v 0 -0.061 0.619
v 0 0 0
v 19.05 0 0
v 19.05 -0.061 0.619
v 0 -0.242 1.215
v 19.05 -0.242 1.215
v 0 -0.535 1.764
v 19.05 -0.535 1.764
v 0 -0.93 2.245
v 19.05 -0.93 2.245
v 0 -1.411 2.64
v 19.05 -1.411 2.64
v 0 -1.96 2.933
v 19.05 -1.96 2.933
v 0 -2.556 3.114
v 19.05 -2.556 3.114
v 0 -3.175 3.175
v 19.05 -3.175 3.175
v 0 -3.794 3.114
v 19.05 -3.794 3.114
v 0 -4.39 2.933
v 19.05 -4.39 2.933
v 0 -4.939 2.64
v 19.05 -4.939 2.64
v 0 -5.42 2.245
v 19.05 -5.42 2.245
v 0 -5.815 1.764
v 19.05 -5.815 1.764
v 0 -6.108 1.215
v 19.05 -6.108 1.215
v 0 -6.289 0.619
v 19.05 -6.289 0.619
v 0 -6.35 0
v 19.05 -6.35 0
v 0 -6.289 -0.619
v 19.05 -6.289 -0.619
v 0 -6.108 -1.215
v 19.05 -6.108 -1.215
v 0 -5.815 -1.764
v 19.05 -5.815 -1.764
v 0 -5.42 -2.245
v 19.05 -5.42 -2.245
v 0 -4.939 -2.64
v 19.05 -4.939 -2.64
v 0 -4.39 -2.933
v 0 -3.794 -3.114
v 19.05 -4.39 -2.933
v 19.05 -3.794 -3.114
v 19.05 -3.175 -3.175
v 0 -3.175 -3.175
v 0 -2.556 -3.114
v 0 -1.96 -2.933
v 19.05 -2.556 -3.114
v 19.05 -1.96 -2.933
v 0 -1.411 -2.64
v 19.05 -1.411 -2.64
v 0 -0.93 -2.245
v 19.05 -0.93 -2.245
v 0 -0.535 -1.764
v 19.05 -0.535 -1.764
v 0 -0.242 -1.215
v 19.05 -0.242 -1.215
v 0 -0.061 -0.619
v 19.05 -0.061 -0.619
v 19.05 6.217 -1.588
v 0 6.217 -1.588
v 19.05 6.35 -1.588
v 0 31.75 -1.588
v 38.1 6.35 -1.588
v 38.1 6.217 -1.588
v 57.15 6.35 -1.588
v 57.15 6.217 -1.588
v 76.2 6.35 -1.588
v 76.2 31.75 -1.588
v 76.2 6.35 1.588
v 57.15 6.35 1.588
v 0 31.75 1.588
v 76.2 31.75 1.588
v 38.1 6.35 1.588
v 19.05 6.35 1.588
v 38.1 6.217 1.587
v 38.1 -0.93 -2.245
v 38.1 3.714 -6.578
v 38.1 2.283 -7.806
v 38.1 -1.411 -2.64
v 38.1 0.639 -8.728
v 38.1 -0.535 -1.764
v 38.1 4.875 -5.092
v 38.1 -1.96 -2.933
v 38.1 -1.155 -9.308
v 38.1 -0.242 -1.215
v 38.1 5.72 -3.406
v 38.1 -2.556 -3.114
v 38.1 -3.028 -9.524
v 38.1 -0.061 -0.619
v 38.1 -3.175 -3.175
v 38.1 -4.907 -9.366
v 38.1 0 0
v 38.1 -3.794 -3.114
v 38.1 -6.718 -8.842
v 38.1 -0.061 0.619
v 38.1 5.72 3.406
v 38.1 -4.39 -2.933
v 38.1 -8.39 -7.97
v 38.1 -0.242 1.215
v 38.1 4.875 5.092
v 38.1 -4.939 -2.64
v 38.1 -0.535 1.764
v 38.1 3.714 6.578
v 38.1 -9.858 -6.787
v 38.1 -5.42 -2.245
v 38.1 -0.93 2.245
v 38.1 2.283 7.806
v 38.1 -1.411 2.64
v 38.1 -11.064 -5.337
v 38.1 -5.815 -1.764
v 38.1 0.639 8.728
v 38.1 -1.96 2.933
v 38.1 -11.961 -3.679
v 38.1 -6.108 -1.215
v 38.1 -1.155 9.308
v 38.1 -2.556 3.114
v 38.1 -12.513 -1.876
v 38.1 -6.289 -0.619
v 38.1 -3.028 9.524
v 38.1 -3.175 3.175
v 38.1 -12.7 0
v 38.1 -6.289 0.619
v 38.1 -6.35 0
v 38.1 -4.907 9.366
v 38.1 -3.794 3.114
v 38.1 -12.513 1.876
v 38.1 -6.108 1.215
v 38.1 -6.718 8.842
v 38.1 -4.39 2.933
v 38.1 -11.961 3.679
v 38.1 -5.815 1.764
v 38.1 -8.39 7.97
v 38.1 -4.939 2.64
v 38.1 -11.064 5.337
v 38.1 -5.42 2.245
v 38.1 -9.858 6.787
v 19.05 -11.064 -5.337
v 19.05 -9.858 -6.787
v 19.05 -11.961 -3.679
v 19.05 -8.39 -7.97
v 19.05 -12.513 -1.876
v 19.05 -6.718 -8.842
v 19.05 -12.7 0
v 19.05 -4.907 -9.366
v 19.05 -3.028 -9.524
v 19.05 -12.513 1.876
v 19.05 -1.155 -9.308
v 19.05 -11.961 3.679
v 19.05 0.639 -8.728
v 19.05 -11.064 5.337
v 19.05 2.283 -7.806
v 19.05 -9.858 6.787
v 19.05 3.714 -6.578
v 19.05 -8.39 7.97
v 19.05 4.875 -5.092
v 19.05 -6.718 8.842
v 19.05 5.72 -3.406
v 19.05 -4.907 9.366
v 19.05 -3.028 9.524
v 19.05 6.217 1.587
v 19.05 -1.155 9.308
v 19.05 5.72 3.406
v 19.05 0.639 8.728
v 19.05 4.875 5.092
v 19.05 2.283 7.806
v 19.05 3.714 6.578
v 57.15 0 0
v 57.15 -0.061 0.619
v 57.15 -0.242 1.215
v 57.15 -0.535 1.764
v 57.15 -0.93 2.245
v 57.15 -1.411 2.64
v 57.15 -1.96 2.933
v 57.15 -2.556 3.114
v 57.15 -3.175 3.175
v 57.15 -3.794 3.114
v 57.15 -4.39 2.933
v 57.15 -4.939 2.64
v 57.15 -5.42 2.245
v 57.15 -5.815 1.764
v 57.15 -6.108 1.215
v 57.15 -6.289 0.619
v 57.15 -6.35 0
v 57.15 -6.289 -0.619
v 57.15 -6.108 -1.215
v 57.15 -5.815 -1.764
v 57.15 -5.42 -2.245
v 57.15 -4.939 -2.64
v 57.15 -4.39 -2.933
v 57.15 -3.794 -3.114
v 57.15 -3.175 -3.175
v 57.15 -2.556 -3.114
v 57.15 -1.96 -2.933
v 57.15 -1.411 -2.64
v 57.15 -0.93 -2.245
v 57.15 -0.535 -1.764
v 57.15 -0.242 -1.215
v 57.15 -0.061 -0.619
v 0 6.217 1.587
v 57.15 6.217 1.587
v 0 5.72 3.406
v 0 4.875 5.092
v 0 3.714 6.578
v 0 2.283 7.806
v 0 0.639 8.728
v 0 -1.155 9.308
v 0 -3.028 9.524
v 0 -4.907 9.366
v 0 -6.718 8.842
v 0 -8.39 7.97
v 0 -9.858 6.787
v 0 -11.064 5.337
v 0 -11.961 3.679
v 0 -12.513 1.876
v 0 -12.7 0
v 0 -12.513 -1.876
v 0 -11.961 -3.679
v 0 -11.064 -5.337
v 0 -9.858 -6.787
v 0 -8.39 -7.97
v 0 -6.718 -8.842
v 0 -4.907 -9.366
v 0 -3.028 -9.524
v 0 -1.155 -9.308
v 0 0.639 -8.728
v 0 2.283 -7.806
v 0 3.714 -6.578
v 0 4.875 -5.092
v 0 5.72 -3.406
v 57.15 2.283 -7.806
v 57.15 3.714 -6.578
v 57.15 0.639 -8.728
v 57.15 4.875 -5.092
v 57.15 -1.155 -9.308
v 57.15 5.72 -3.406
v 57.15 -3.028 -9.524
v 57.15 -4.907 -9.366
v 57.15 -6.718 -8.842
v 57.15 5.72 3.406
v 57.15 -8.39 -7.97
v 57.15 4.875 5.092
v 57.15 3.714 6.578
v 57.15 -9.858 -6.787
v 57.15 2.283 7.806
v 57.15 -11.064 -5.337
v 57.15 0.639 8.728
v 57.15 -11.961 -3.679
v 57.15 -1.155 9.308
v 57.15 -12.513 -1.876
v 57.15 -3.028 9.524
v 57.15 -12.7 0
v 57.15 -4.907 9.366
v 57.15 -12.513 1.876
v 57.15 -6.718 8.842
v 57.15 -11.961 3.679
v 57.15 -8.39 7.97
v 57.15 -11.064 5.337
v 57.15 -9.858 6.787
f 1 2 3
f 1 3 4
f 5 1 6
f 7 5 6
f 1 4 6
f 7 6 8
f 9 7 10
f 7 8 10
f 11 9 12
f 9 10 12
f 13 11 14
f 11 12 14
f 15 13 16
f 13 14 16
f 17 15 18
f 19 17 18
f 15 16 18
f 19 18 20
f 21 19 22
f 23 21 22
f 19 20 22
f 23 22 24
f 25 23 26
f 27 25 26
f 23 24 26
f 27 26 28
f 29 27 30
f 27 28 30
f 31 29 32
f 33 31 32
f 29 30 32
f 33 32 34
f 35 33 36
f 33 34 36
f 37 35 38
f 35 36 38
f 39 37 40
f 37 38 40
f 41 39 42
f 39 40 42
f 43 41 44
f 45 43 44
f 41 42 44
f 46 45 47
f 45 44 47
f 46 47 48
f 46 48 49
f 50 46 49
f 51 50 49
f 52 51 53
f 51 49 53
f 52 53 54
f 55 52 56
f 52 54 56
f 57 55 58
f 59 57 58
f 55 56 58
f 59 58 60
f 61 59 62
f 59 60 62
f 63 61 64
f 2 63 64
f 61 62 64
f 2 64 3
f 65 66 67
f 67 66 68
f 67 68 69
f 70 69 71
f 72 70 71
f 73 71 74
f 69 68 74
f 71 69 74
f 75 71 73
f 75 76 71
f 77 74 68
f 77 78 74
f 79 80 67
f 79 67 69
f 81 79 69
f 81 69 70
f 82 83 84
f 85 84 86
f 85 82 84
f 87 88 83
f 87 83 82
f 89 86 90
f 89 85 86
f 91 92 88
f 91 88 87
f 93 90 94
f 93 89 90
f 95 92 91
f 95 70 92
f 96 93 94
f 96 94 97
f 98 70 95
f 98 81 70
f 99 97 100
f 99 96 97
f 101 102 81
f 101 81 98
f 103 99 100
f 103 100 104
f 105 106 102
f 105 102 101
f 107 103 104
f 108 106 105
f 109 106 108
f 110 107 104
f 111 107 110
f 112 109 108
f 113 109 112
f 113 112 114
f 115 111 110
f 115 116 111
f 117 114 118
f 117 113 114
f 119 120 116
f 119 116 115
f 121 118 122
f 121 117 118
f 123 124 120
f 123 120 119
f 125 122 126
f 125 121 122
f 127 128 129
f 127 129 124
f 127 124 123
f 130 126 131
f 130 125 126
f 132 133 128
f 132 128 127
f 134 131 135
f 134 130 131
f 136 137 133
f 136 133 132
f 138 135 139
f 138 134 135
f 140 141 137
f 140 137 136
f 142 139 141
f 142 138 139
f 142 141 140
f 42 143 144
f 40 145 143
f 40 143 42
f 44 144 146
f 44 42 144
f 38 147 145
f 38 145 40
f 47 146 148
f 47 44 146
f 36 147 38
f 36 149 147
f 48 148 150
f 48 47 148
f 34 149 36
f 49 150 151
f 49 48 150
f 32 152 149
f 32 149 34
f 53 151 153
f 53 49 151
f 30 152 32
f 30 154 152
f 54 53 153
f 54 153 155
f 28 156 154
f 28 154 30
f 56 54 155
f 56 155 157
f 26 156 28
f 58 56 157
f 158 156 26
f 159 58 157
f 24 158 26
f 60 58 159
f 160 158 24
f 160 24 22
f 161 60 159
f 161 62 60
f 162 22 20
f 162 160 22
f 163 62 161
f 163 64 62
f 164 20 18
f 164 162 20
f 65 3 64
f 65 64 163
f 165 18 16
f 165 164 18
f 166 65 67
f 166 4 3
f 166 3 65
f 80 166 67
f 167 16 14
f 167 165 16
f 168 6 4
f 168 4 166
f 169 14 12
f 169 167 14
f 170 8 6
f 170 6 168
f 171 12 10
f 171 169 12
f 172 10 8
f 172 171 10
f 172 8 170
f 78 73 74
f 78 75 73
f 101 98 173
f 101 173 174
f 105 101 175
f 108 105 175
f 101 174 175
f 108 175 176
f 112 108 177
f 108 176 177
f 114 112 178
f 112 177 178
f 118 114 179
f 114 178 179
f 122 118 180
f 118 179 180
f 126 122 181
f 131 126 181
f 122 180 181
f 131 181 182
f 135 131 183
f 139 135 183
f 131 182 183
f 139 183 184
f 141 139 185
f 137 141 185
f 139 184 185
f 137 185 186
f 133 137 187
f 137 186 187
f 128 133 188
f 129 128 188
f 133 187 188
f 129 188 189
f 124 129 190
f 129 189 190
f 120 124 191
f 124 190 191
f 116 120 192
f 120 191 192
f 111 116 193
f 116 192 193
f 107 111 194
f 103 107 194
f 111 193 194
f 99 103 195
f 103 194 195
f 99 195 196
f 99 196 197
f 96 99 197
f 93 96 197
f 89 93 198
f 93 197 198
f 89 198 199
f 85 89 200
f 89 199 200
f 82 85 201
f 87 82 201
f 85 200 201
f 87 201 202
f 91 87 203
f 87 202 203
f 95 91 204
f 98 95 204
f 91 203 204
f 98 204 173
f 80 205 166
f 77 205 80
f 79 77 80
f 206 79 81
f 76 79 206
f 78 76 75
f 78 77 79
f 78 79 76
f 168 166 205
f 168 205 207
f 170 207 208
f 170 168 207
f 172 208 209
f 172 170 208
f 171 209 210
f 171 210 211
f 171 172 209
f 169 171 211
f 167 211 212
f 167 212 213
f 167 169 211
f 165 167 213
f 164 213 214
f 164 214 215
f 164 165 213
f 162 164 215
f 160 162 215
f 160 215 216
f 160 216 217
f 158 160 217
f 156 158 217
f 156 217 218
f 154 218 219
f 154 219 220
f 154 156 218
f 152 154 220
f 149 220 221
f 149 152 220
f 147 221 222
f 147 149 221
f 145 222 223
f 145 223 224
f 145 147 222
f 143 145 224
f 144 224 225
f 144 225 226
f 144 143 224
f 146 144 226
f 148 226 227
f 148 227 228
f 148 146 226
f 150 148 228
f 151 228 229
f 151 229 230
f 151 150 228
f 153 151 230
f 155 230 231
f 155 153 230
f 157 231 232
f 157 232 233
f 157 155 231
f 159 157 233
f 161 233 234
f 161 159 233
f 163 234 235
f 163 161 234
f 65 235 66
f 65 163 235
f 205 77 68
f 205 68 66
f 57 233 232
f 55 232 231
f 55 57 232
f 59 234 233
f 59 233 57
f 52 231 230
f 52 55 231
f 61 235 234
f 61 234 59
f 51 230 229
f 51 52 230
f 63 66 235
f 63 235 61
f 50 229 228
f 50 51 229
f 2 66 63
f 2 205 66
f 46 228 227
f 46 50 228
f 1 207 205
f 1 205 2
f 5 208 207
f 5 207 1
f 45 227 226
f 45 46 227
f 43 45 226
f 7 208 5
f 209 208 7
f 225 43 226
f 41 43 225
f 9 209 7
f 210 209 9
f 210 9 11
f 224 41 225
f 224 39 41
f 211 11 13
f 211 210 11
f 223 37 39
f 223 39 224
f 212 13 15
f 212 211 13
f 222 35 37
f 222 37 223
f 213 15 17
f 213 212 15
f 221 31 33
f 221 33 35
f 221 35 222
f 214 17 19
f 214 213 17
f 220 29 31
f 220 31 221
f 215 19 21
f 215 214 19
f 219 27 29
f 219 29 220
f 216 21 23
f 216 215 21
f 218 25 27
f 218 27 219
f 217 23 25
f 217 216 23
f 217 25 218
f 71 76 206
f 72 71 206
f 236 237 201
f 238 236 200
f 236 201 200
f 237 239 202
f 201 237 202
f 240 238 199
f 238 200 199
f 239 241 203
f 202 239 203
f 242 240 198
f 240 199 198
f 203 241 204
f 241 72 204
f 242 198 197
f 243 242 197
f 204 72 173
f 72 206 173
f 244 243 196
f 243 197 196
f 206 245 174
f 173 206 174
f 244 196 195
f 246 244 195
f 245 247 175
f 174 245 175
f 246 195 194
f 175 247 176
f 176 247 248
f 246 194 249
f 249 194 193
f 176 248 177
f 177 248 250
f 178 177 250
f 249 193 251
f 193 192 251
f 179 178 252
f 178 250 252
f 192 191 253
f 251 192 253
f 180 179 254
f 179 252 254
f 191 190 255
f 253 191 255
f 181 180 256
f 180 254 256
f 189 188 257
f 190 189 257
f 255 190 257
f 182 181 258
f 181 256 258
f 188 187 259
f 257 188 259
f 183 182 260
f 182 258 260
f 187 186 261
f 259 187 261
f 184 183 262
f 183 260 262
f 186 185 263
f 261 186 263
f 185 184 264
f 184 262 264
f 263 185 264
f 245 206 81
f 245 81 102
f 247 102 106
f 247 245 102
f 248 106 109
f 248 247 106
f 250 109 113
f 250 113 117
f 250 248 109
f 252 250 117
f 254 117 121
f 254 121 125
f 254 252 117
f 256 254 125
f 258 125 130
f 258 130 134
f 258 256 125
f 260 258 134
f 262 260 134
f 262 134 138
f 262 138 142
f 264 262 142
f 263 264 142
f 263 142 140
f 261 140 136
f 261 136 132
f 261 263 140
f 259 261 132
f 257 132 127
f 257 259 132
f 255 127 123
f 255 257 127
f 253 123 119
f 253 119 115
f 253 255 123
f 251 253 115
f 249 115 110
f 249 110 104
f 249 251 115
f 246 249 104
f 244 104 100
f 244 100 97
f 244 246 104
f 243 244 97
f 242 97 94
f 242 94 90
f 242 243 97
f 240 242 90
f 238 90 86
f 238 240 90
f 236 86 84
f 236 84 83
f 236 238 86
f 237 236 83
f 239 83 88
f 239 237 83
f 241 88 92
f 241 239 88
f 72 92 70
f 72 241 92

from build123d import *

# Parameters (mm, degrees)
F1_DEPTH = 1.5875
F2_W     = 19.05
F2_H     = 6.35


with BuildPart() as f1:
    # F0 (on Top) → F1 (new body, symmetric)
    with BuildSketch(Plane.XY):
        Polygon((76.2, 31.75), (0, 31.75), (0, 0), (19.05, 0), (19.05, 6.35), (38.1, 6.35), (38.1, 0), (57.15, 0), (57.15, 6.35), (76.2, 6.35), align=None)
    extrude(amount=F1_DEPTH, both=True)

    # F2 (on Top) → F3 (revolve)
    with BuildSketch(Plane.XY):
        with Locations((47.625, 3.175)):
            Rectangle(F2_W, F2_H)
        with Locations((9.525, 3.175)):
            Rectangle(F2_W, F2_H)
    revolve(axis=Axis((45.199081, -3.175, 0), (1, 0, 0)))


solid = f1.part
